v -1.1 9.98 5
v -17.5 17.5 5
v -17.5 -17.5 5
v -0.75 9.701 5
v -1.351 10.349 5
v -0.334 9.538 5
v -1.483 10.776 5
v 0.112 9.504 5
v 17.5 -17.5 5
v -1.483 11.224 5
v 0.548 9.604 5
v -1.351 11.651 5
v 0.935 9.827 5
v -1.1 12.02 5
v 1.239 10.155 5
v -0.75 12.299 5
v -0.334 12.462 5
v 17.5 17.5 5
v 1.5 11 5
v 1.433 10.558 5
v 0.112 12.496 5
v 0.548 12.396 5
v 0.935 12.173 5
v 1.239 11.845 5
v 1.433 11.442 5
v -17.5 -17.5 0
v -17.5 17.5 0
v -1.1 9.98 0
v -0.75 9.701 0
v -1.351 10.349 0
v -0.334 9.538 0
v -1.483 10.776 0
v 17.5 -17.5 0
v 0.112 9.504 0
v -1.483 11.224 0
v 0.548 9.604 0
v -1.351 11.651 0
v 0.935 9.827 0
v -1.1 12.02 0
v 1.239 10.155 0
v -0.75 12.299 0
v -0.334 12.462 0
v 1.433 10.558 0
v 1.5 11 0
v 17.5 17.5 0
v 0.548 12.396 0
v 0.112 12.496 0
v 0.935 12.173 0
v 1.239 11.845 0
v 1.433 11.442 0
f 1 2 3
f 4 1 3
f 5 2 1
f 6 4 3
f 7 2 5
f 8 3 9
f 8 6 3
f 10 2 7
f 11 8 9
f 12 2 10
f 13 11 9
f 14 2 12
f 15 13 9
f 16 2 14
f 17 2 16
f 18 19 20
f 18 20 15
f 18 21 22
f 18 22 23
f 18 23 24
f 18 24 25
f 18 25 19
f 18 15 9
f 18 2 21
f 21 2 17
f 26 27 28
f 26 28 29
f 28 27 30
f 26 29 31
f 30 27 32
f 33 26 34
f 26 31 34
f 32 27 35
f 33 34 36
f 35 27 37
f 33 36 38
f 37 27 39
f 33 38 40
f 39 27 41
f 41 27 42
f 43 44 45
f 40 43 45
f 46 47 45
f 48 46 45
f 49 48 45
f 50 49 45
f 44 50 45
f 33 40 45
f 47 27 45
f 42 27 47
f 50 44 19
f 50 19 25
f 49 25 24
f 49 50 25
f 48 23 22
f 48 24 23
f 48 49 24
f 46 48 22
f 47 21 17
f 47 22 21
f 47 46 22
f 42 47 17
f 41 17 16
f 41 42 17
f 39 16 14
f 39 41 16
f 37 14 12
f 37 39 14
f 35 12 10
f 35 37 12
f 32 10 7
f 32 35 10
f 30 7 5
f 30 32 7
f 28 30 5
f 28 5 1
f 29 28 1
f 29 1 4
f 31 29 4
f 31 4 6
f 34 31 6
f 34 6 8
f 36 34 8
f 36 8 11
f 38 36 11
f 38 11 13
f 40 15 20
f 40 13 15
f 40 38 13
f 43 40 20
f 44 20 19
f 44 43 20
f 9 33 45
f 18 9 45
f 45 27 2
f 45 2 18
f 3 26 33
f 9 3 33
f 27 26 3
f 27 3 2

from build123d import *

# Parameters (mm, degrees)
SKETCH2_W               = 35
SKETCH2_H               = 35
BOSS_EXTRUDE1_DEPTH     = 5
CUT_EXTRUDE1_DEPTH      = 26.248762346
CUT_EXTRUDE1_DEPTH_BACK = 26.248762346
SKETCH3_R               = 1.5


with BuildPart() as part:
    # Sketch2 → Boss-Extrude1 (new body)
    with BuildSketch(Plane.XY):
        Rectangle(SKETCH2_W, SKETCH2_H)
    extrude(amount=BOSS_EXTRUDE1_DEPTH)

    # Sketch3 → Cut-Extrude1 (cut, two sides: drawn at the far end of the back side and taken through both)
    with BuildSketch(Plane.XY.offset(5).offset(-CUT_EXTRUDE1_DEPTH_BACK)):
        with Locations((0, 11)):
            Circle(SKETCH3_R)
    extrude(amount=CUT_EXTRUDE1_DEPTH + CUT_EXTRUDE1_DEPTH_BACK, mode=Mode.SUBTRACT)


solid = part.part
